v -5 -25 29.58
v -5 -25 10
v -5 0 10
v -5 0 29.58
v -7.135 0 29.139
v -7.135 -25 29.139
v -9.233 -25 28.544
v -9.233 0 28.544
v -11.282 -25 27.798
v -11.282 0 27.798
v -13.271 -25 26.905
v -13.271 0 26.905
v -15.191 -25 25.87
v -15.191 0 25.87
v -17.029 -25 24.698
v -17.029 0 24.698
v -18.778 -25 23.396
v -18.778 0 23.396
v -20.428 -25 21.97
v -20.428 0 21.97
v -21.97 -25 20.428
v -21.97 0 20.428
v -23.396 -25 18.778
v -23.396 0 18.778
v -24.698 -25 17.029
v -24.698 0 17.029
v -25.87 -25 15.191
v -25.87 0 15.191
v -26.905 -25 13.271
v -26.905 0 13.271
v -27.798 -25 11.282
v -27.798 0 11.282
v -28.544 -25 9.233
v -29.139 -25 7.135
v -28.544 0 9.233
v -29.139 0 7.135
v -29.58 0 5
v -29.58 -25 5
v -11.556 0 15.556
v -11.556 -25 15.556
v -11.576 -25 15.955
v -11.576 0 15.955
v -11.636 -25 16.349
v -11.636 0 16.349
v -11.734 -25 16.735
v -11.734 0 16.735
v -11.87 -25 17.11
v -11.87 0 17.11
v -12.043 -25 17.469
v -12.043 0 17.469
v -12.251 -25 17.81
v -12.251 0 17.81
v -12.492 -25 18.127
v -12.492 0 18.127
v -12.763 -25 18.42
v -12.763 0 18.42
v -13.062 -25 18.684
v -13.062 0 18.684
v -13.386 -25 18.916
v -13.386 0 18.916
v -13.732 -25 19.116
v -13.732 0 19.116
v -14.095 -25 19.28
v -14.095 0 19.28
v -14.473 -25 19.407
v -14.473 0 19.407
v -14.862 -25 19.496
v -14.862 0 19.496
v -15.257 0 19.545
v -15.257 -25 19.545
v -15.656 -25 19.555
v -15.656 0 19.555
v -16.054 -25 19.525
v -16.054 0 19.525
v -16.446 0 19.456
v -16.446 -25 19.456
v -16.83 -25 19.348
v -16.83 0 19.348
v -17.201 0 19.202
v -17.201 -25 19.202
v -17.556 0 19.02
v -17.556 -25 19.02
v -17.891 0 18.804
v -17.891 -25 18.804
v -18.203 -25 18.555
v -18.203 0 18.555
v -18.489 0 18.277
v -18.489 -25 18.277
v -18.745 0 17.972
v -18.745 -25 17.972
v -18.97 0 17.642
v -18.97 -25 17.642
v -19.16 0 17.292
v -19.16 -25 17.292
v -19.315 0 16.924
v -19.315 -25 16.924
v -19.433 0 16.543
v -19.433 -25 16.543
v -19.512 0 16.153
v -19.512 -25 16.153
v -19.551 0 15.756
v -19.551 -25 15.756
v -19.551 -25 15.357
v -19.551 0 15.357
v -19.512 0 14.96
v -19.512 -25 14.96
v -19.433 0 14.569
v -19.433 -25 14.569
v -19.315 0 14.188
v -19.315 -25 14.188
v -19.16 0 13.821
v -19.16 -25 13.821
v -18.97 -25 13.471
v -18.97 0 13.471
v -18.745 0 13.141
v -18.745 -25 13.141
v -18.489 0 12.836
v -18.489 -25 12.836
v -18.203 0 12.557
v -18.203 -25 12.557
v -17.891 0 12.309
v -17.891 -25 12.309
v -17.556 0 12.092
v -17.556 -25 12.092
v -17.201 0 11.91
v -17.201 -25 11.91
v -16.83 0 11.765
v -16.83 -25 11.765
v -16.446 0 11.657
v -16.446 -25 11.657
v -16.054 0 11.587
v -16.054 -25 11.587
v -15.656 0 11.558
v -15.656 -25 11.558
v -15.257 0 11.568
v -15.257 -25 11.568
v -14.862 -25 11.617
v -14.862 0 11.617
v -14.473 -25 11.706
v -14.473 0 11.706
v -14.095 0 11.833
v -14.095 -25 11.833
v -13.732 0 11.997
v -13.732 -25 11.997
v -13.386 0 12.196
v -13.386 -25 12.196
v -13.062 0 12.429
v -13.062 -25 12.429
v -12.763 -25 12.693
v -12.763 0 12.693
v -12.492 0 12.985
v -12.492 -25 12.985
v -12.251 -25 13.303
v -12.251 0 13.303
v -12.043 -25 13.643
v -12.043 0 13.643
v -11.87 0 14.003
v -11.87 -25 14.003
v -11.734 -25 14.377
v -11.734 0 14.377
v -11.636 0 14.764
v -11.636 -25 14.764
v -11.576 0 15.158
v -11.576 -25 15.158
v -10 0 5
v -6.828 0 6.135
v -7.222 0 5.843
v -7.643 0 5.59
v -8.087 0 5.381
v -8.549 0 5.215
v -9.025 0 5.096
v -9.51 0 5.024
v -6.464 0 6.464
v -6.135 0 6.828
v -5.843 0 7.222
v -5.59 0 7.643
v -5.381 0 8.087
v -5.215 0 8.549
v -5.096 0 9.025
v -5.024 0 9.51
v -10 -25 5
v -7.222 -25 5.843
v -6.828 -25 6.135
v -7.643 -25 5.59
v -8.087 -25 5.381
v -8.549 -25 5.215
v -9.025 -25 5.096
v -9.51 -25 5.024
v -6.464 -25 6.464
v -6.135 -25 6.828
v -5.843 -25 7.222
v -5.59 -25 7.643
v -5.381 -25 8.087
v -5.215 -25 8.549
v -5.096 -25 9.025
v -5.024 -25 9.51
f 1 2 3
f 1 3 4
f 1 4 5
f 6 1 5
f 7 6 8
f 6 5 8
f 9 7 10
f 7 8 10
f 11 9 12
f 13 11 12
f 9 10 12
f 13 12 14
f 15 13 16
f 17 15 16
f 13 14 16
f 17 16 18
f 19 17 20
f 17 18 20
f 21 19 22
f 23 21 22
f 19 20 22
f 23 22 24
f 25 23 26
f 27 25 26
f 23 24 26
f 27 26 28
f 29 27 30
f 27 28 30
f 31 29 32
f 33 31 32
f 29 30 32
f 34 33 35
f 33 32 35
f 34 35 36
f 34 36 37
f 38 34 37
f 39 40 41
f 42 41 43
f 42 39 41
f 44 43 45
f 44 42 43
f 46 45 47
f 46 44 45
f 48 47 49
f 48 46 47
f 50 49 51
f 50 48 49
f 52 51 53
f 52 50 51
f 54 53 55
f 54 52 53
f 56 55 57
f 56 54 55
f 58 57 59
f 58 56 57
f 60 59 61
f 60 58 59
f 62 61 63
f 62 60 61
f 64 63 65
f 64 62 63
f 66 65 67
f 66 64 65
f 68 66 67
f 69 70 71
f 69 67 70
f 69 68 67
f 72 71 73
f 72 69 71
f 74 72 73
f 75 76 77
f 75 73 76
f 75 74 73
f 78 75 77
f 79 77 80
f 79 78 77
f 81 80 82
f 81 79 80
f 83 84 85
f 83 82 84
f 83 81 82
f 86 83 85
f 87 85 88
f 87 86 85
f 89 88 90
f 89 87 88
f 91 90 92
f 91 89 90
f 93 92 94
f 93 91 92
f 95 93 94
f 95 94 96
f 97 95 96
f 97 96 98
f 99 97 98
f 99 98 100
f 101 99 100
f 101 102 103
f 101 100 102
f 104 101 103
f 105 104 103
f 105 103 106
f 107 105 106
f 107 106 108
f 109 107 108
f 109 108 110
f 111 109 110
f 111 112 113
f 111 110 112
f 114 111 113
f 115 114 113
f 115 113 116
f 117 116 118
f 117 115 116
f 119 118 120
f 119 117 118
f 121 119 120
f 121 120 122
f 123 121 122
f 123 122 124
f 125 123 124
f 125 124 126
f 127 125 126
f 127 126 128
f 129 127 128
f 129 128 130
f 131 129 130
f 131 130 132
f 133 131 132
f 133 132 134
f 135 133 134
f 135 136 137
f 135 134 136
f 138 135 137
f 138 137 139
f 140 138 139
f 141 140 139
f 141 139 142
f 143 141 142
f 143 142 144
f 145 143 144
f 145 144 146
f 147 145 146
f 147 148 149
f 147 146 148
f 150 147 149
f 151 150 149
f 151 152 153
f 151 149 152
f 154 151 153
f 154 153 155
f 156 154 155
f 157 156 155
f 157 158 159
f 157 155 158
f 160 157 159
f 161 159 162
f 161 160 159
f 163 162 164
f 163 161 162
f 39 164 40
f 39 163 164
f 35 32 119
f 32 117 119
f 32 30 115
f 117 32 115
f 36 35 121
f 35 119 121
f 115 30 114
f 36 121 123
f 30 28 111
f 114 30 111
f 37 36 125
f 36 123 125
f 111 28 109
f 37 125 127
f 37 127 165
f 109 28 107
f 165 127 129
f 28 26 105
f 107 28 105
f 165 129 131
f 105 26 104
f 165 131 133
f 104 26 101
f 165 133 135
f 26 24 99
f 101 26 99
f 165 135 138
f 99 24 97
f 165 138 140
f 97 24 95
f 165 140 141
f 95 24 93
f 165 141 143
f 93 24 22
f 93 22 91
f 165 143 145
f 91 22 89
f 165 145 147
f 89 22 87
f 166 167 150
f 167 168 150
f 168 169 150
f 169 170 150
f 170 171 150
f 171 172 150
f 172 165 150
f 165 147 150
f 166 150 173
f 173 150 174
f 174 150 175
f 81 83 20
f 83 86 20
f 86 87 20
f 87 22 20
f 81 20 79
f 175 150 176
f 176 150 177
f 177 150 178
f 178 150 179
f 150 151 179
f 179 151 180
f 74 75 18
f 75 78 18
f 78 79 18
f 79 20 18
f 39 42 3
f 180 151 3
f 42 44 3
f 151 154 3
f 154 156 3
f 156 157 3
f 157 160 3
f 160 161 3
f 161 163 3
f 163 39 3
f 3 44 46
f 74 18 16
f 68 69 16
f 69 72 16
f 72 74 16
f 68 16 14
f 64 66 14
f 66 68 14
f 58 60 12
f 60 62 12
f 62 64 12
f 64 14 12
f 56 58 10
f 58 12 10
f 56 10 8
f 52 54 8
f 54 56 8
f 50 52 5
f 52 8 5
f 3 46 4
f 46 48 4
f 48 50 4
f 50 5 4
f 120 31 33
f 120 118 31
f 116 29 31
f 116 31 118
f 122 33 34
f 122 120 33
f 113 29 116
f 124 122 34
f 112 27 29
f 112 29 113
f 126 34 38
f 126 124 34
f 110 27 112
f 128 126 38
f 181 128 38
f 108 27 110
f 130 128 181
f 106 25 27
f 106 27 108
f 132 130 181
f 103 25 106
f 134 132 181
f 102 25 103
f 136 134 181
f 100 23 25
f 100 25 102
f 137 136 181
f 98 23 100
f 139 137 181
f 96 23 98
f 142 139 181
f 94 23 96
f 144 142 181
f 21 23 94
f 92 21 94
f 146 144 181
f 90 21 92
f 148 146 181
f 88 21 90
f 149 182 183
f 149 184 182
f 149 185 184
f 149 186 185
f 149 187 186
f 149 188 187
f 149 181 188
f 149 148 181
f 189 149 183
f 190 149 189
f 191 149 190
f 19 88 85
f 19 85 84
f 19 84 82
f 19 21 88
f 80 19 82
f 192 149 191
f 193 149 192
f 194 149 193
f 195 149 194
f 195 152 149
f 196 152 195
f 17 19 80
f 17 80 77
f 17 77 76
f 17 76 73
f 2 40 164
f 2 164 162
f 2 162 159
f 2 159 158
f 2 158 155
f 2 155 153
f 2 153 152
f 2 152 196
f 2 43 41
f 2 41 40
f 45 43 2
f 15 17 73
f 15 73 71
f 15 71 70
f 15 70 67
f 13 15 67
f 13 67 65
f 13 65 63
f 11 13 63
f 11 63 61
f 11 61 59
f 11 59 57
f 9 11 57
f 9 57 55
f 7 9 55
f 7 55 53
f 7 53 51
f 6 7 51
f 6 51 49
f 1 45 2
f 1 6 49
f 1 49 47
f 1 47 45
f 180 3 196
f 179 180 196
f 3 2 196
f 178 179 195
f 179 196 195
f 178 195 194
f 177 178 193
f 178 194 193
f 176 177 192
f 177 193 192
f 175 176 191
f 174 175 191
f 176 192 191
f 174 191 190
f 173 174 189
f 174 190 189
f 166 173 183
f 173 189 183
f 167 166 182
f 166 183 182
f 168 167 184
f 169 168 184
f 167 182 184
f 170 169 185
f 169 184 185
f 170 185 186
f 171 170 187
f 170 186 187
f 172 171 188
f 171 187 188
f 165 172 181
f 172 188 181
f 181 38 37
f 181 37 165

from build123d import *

# Parameters (mm, degrees)
F1_DEPTH = 25
F2_R     = 5
F3_R     = 4
F4_DEPTH = 47.8


with BuildPart() as f1:
    # F0 (on Front) → F1 (new body)
    with BuildSketch(Plane.XZ):
        with BuildLine():
            Line((-5, 5), (-5, 29.5803989155))
            ThreePointArc((-5, 29.5803989155), (-21.2132034356, 21.2132034356), (-29.5803989155, 5))
            Line((-29.5803989155, 5), (-5, 5))
        make_face()
    extrude(amount=F1_DEPTH)

    # F2
    f2_edges = [f1.edges().sort_by_distance(p)[0] for p in [
        (-5, -12.5, 5),
    ]]
    fillet(f2_edges, radius=F2_R)

    # F3 (on Front) → F4 (cut)
    with BuildSketch(Plane.XZ):
        with Locations((-15.5563491861, 15.5563491861)):
            Circle(F3_R)
    extrude(amount=F4_DEPTH, mode=Mode.SUBTRACT)


solid = f1.part
